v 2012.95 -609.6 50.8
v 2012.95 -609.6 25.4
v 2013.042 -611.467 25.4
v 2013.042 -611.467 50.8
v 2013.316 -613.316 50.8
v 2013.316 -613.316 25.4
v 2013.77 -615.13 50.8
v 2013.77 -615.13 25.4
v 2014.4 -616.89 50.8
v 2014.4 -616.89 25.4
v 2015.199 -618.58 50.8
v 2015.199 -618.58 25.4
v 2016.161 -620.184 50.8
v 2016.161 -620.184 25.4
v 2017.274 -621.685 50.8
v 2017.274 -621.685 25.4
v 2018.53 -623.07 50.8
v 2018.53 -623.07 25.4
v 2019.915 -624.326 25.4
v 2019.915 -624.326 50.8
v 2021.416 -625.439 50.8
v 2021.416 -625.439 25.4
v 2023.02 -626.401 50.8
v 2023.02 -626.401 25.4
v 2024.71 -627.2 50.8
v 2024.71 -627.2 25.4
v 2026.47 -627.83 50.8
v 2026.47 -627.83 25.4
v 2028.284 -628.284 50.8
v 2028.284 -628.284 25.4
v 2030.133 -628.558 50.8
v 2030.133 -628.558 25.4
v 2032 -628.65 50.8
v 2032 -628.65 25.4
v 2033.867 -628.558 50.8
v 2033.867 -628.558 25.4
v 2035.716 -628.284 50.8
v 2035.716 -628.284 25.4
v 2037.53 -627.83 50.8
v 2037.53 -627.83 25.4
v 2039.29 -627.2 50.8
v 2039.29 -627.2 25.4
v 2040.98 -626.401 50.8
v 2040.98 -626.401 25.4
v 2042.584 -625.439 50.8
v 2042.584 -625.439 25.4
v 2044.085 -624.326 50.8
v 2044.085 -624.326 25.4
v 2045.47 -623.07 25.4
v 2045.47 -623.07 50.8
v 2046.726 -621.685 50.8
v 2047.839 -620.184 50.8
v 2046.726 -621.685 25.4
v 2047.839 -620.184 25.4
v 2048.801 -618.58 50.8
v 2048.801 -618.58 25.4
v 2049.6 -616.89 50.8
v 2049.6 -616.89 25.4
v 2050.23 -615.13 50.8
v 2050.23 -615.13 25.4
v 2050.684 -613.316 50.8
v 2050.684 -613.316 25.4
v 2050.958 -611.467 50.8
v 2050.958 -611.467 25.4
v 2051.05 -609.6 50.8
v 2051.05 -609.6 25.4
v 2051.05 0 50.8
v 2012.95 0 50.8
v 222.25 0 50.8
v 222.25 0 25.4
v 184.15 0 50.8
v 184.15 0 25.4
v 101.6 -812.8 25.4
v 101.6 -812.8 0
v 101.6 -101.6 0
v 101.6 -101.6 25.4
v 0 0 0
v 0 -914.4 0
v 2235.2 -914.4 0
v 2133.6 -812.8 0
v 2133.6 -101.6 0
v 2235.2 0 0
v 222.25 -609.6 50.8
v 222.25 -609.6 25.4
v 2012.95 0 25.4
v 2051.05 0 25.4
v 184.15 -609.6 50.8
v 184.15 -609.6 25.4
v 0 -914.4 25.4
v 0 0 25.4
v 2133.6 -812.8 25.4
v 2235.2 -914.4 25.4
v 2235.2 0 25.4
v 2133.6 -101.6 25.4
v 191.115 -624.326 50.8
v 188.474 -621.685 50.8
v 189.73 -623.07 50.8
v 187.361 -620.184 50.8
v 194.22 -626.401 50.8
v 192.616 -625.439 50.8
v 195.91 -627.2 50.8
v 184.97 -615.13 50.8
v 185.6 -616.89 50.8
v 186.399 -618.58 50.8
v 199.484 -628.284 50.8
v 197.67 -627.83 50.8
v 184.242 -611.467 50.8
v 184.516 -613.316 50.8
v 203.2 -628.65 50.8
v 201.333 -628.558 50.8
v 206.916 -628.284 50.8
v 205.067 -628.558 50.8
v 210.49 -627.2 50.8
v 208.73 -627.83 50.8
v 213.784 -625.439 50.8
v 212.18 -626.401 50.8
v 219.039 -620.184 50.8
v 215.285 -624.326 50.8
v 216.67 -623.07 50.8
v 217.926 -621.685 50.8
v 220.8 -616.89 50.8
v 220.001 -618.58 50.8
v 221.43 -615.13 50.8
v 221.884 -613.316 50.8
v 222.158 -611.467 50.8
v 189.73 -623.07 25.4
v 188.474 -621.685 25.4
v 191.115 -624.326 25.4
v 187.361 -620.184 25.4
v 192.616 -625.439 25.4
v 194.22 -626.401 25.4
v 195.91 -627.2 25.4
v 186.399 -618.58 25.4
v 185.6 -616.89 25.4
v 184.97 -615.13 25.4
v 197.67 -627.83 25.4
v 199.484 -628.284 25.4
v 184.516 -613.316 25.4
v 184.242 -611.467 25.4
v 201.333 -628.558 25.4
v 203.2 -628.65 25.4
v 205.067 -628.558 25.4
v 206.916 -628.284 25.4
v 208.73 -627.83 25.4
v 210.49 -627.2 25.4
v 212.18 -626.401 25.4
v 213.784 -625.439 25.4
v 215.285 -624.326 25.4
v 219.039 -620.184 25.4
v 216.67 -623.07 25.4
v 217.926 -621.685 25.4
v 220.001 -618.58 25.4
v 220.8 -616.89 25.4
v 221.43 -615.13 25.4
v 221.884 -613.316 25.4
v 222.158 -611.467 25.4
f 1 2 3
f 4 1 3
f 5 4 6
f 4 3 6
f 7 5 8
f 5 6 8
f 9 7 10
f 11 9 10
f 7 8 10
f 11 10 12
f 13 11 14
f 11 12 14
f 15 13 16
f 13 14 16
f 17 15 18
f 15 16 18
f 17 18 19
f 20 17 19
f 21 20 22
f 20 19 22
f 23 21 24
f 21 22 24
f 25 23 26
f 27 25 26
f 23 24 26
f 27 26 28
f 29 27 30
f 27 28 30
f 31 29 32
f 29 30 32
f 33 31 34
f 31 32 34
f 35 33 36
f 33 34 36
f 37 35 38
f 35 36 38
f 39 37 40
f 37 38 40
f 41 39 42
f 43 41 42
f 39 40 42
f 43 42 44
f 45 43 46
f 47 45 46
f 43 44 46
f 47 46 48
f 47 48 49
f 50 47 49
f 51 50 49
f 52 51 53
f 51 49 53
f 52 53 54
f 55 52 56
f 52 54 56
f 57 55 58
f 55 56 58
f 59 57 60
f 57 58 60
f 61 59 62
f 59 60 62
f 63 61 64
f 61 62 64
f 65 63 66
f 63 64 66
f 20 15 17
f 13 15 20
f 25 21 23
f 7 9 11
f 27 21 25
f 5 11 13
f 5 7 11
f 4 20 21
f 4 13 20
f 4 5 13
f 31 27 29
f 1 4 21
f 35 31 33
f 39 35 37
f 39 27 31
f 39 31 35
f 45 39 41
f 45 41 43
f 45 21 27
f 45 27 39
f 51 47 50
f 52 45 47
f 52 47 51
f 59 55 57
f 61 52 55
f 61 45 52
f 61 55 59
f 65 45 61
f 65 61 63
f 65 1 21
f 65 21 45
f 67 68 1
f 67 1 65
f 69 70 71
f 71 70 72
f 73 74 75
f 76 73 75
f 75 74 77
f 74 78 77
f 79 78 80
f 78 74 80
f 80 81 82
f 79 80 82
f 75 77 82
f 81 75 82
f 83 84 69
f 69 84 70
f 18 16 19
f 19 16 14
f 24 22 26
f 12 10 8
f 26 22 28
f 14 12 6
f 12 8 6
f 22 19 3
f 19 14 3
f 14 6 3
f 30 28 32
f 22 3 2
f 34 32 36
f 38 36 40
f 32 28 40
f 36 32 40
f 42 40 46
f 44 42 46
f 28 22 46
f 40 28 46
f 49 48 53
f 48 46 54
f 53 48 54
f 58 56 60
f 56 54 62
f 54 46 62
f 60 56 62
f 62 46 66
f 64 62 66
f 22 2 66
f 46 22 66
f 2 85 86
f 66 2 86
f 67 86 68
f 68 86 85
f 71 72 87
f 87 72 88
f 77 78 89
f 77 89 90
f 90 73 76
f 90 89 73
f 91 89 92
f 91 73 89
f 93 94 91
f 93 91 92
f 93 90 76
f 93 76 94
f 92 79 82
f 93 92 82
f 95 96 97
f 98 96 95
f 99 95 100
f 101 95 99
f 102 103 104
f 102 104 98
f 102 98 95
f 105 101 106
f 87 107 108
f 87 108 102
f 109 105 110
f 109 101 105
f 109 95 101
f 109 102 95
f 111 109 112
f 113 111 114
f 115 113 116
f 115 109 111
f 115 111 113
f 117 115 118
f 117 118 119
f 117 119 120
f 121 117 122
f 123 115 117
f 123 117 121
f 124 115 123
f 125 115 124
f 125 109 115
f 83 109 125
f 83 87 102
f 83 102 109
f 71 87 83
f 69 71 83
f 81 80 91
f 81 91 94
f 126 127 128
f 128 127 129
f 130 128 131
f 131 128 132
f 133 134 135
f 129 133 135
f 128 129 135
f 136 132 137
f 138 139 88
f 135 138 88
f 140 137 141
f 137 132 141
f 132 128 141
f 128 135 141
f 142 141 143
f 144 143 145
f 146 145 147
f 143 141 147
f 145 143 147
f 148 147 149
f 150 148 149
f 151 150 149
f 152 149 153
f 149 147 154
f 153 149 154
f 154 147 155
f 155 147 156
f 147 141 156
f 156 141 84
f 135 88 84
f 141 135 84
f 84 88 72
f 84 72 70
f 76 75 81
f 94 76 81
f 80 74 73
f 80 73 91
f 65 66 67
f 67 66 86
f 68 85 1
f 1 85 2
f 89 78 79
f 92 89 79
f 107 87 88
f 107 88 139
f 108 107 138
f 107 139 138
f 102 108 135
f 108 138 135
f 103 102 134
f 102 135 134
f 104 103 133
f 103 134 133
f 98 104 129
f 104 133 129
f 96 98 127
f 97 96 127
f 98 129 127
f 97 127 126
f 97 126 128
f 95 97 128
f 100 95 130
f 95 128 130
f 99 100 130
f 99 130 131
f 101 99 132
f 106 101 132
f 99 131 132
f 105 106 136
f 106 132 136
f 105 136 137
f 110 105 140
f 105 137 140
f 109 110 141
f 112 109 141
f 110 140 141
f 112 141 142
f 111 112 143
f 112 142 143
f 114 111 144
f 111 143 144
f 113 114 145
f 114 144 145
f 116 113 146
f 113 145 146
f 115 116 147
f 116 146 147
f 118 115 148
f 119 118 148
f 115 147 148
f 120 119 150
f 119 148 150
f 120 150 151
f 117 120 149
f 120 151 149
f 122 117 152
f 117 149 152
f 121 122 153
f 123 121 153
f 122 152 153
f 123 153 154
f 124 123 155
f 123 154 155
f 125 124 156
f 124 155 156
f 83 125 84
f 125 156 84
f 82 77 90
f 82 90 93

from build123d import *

# Parameters (mm, degrees)
F0_W     = 2235.2
F0_H     = 914.4
F0_W_2   = 2032
F0_H_2   = 711.2
F1_DEPTH = 25.4
F3_DEPTH = 25.4


with BuildPart() as f1:
    # F0 (on Top) → F1 (new body)
    with BuildSketch(Plane.XY):
        with Locations((1117.6, -457.2)):
            Rectangle(F0_W, F0_H)
        with Locations((1117.6, -457.2)):
            Rectangle(F0_W_2, F0_H_2, mode=Mode.SUBTRACT)
    extrude(amount=F1_DEPTH)


with BuildPart() as f3:
    # F2 (on face) → F3 (new body)
    with BuildSketch(Plane.XY.offset(25.4)):
        with BuildLine():
            Line((222.25, 0), (184.15, 0))
            Line((184.15, 0), (184.15, -609.6))
            ThreePointArc((184.15, -609.6), (203.2, -590.55), (222.25, -609.6))
            Line((222.25, -609.6), (222.25, 0))
        make_face()
        with BuildLine():
            ThreePointArc((222.25, -609.6), (203.2, -590.55), (184.15, -609.6))
            Line((184.15, -609.6), (222.25, -609.6))
        make_face()
        with BuildLine():
            Line((222.25, -609.6), (184.15, -609.6))
            ThreePointArc((184.15, -609.6), (203.2, -628.65), (222.25, -609.6))
        make_face()
    extrude(amount=F3_DEPTH)


with BuildPart() as f3b:
    # F2 (on face) → F3, piece 2 (new body)
    with BuildSketch(Plane.XY.offset(25.4)):
        with BuildLine():
            Line((2051.05, 0), (2012.95, 0))
            Line((2012.95, 0), (2012.95, -609.6))
            ThreePointArc((2012.95, -609.6), (2032, -590.55), (2051.05, -609.6))
            Line((2051.05, -609.6), (2051.05, 0))
        make_face()
        with BuildLine():
            ThreePointArc((2051.05, -609.6), (2032, -590.55), (2012.95, -609.6))
            Line((2012.95, -609.6), (2051.05, -609.6))
        make_face()
        with BuildLine():
            Line((2051.05, -609.6), (2012.95, -609.6))
            ThreePointArc((2012.95, -609.6), (2032, -628.65), (2051.05, -609.6))
        make_face()
    extrude(amount=F3_DEPTH)


solid = Compound([f1.part, f3.part, f3b.part])
